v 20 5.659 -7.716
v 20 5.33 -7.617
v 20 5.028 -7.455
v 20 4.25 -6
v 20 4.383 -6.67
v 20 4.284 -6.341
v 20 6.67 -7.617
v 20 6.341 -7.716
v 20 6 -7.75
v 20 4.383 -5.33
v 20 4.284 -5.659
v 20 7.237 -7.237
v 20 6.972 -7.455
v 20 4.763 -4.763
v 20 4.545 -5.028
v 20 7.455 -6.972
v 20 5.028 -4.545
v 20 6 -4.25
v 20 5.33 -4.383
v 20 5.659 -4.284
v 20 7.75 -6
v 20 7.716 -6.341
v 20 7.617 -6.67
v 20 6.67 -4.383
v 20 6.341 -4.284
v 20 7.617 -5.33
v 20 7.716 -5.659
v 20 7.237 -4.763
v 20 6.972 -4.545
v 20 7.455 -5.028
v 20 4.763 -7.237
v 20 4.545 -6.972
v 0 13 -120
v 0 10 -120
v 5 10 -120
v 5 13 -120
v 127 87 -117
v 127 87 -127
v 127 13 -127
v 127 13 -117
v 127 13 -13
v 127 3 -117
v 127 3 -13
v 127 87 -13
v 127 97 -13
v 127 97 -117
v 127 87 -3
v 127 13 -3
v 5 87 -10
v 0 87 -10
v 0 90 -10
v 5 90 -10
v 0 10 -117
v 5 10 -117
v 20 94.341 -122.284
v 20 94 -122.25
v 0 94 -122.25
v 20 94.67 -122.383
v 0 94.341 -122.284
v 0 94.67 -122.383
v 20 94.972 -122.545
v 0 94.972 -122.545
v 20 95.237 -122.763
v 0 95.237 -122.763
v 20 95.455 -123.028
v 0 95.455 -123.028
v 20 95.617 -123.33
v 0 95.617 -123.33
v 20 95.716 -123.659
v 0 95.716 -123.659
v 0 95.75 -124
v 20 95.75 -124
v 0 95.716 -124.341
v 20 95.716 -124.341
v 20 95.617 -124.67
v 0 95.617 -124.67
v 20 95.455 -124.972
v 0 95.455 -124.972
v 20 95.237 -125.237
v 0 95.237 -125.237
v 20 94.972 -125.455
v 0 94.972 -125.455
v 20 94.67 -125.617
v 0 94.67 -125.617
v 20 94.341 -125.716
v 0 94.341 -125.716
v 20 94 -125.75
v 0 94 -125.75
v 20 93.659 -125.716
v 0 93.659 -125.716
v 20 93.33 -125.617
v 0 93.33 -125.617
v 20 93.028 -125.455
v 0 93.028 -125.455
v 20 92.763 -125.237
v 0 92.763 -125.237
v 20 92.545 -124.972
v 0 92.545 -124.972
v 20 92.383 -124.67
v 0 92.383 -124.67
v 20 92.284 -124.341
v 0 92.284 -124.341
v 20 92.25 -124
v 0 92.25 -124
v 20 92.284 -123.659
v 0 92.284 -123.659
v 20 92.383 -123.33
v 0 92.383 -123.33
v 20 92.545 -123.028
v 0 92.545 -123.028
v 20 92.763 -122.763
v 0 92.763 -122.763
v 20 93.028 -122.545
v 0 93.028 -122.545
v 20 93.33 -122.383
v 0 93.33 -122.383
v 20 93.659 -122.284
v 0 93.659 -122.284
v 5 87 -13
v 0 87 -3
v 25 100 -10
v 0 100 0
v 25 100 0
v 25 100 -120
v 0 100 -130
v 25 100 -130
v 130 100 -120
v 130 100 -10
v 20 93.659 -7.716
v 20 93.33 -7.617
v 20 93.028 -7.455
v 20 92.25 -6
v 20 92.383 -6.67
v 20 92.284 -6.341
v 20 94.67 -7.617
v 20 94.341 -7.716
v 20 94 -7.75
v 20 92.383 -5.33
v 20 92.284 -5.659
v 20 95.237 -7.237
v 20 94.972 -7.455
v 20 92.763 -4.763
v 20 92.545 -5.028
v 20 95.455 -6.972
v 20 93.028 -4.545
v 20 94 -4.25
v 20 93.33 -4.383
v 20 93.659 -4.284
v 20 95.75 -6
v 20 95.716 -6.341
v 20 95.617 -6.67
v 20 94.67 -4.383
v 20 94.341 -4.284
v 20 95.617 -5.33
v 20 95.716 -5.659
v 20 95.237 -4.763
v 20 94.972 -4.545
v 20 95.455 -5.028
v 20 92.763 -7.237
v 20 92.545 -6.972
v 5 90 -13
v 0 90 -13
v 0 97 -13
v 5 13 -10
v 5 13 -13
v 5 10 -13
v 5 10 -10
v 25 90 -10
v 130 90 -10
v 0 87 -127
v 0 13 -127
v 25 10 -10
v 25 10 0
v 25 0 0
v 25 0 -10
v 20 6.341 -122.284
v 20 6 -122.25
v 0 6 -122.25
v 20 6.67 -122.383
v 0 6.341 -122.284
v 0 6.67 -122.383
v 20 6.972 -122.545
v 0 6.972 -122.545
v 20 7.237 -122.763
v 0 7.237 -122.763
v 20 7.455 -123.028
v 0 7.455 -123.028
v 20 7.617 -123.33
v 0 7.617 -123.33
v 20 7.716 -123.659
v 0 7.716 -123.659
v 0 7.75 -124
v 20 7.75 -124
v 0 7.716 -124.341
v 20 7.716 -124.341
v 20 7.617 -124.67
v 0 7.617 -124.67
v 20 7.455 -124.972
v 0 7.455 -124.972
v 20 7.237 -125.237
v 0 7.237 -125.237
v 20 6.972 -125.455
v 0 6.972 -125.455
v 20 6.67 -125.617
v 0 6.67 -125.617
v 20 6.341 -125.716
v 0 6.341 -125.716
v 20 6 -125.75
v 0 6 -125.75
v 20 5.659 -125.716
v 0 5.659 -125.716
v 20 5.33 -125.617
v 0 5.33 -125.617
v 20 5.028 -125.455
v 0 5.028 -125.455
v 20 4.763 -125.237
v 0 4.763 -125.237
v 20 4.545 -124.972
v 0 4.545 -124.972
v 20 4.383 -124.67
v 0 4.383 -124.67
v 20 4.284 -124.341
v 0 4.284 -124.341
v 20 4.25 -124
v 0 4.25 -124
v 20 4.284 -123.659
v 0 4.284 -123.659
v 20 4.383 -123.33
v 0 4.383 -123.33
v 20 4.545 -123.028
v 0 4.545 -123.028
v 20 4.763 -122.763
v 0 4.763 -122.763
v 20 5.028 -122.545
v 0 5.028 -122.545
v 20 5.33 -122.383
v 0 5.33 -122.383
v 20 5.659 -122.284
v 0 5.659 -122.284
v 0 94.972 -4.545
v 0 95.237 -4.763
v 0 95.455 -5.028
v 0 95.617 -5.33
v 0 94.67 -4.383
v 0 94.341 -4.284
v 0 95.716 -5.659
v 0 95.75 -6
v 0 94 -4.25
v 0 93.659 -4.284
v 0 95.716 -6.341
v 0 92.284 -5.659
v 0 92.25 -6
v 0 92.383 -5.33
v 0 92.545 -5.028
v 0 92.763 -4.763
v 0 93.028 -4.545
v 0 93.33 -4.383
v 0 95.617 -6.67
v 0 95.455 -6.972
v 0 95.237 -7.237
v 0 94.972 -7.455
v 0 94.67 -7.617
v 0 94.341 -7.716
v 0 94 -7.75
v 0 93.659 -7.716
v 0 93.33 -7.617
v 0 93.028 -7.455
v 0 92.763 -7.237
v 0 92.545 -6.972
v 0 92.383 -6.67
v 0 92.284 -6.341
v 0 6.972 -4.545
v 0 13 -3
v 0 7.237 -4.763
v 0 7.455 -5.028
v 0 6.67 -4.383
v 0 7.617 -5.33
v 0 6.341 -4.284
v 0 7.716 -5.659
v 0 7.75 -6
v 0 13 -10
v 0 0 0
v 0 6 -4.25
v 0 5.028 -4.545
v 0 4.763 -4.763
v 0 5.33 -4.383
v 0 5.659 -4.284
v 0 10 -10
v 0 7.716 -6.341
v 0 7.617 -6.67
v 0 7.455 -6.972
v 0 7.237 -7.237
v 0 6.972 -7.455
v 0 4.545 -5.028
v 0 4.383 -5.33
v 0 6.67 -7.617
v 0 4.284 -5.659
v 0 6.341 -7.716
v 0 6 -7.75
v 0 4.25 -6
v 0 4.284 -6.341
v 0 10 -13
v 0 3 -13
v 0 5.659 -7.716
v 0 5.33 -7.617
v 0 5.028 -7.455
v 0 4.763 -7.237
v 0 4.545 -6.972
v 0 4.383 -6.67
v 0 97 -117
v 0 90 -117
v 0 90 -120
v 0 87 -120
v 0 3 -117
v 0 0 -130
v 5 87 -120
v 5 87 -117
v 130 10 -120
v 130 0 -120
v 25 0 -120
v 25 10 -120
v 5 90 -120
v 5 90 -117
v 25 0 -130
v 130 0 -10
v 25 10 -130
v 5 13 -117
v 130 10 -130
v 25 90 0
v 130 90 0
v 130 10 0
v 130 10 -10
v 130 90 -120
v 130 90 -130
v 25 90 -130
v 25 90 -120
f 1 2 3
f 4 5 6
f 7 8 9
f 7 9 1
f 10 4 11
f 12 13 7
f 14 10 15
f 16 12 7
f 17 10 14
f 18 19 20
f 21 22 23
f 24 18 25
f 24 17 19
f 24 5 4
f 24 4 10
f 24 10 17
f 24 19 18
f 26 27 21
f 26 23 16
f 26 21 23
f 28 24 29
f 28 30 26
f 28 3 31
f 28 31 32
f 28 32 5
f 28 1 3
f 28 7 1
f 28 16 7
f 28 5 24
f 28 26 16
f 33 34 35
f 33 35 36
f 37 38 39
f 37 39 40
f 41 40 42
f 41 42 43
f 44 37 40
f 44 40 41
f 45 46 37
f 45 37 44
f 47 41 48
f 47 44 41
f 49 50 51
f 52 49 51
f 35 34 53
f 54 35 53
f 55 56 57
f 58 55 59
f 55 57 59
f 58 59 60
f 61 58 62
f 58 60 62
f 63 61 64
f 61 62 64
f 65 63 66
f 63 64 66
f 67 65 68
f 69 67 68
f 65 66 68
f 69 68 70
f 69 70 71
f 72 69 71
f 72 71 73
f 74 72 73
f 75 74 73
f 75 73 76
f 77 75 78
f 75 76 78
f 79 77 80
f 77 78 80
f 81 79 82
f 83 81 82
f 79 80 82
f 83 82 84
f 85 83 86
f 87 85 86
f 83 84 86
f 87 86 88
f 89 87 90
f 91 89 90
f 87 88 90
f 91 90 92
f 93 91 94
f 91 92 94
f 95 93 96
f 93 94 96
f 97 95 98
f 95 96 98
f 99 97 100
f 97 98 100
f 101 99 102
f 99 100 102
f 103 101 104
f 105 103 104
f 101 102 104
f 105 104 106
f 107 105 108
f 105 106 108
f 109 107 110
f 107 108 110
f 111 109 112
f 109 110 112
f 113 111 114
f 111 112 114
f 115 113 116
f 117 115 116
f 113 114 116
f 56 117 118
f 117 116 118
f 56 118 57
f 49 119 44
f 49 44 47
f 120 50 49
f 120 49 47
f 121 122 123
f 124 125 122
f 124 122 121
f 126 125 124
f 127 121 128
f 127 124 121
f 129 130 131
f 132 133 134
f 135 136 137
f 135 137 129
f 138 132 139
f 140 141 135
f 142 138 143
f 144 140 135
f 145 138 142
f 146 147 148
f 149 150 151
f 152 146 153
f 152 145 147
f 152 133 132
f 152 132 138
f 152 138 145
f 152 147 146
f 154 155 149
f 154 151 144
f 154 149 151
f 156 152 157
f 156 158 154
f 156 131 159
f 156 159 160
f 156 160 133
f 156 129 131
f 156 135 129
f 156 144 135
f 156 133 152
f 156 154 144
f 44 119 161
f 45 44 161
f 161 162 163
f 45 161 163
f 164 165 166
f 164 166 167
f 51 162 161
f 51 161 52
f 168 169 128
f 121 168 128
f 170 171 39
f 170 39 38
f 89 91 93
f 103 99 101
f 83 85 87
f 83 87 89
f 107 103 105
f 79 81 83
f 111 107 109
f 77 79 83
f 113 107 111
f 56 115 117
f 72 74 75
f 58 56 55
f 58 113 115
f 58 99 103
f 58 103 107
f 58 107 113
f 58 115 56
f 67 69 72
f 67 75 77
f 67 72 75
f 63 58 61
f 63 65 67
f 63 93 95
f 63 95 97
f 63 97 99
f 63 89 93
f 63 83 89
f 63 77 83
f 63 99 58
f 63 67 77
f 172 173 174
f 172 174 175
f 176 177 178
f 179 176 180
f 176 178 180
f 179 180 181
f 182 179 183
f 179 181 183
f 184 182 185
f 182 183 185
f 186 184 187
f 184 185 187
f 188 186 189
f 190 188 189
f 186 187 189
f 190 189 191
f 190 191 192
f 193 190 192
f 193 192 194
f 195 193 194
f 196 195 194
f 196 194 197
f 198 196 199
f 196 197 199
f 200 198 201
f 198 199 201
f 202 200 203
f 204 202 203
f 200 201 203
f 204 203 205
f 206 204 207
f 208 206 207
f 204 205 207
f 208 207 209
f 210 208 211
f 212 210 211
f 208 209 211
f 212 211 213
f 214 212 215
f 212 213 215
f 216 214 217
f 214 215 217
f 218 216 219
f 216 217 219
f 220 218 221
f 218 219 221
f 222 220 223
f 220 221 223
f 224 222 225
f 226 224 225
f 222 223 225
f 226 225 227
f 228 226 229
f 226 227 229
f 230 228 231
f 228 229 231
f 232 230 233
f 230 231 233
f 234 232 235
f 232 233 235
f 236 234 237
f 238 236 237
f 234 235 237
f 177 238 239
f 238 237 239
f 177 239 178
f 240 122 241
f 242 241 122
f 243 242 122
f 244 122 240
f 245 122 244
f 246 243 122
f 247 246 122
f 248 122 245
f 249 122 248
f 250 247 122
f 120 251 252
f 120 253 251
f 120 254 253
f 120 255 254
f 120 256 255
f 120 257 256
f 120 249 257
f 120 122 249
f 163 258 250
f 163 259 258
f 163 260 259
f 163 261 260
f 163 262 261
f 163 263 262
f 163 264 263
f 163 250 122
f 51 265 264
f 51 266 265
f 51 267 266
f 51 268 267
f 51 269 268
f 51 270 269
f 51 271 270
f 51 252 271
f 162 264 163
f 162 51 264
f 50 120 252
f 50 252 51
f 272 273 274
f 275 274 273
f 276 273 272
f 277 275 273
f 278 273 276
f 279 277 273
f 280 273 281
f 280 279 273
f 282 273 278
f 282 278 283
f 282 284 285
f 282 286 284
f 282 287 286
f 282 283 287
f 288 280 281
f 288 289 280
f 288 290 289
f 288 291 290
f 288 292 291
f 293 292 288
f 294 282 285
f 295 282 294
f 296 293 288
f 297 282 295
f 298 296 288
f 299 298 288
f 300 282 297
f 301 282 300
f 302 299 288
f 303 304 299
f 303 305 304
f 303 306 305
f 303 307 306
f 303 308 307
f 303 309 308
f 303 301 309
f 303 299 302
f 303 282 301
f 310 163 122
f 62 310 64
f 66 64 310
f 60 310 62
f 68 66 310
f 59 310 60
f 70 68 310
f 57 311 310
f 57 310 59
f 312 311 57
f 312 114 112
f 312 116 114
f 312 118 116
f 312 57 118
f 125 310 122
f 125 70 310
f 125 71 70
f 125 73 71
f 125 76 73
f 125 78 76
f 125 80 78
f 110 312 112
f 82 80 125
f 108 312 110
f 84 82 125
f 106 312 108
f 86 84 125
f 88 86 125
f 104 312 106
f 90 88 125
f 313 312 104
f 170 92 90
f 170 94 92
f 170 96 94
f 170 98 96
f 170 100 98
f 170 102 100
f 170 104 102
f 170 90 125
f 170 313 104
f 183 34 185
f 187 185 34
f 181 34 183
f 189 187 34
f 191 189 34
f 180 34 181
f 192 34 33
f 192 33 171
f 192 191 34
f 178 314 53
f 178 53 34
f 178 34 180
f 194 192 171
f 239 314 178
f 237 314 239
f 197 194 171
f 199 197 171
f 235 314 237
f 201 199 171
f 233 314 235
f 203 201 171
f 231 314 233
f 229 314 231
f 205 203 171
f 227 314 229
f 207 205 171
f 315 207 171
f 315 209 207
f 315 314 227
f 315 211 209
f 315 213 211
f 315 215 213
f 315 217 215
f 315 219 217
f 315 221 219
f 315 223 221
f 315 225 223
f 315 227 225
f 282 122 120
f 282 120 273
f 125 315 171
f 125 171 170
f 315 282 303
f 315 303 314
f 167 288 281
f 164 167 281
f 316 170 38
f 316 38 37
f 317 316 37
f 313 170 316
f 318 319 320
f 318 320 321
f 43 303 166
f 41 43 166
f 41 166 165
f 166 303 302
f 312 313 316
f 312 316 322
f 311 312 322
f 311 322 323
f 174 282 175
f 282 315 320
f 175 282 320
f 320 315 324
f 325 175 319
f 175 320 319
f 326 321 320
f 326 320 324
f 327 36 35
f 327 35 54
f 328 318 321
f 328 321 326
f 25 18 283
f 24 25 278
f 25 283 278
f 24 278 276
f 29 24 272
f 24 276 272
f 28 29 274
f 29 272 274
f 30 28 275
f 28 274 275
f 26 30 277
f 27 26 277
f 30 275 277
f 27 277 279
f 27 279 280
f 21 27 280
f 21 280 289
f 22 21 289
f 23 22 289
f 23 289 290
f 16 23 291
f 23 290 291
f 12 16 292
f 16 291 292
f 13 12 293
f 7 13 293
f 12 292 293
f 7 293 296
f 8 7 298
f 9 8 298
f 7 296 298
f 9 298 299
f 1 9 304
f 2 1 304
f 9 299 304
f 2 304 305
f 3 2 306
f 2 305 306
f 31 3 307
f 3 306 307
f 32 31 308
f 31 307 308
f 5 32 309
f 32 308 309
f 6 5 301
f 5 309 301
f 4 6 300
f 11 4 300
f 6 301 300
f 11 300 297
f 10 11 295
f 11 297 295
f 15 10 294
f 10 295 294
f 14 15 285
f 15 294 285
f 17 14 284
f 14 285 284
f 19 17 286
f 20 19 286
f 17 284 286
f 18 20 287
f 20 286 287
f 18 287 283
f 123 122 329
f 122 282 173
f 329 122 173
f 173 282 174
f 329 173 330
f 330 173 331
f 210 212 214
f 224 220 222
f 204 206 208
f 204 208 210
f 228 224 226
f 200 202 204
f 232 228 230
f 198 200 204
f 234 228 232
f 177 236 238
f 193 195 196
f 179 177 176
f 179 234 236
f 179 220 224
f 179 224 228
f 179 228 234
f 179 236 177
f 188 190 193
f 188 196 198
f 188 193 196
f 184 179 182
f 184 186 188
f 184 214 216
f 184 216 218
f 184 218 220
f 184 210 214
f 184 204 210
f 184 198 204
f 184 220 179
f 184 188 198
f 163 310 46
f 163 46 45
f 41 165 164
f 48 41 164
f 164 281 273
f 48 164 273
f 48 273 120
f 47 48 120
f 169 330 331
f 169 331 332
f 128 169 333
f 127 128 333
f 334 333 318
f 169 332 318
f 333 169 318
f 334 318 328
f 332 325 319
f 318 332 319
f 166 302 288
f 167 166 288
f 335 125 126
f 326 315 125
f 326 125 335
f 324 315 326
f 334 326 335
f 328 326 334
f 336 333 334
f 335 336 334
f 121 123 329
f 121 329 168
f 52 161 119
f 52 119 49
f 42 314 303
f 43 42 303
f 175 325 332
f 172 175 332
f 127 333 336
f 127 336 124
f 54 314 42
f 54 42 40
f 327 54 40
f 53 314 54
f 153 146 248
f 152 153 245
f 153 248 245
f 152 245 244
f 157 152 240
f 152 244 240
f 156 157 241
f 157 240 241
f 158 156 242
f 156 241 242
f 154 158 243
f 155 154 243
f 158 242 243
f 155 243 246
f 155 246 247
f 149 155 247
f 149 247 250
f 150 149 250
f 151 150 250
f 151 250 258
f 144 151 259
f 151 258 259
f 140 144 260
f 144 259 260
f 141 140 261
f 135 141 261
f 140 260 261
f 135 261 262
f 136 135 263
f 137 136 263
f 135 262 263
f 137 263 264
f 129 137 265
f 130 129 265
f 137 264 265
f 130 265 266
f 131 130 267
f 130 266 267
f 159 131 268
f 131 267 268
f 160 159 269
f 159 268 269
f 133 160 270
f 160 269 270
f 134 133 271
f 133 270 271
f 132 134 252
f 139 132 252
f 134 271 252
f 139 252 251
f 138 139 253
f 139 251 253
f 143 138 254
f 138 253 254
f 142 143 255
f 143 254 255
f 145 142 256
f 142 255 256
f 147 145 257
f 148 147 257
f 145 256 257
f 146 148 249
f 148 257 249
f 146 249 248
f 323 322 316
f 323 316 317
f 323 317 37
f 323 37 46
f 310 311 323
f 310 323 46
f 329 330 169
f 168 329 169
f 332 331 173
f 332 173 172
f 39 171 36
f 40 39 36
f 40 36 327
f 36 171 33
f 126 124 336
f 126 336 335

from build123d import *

# Parameters (mm, degrees)
SKETCH2_W           = 130
SKETCH2_H           = 130
BOSS_EXTRUDE1_DEPTH = 100
SKETCH3_W           = 104
SKETCH3_H           = 74
CUT_EXTRUDE1_DEPTH  = 127
SKETCH4_W           = 10
SKETCH4_H           = 10
CUT_EXTRUDE3_DEPTH  = 105
SKETCH5_W           = 104
SKETCH5_H           = 10
CUT_EXTRUDE4_DEPTH  = 127
SKETCH6_W           = 10
SKETCH6_H           = 74
CUT_EXTRUDE5_DEPTH  = 127
SKETCH7_R           = 1.75
CUT_EXTRUDE6_DEPTH  = 20
SKETCH8_W           = 3
SKETCH8_H           = 3
CUT_EXTRUDE7_DEPTH  = 5


with BuildPart() as part:
    # Sketch2 → Boss-Extrude1 (new body)
    with BuildSketch(Plane(origin=(0, 0, 0), x_dir=(1, 0, 0), z_dir=(0, 1, 0))):
        with Locations((65, 65)):
            Rectangle(SKETCH2_W, SKETCH2_H)
    extrude(amount=BOSS_EXTRUDE1_DEPTH)

    # Sketch3 → Cut-Extrude1 (cut)
    with BuildSketch(Plane.ZY):
        with Locations((-65, 50)):
            Rectangle(SKETCH3_W, SKETCH3_H)
    extrude(amount=-CUT_EXTRUDE1_DEPTH, mode=Mode.SUBTRACT)

    # Sketch4 → Cut-Extrude3 (cut)
    with BuildSketch(Plane(origin=(130, 0, 0), x_dir=(0, 0, -1), z_dir=(1, 0, 0))):
        with Locations((5, 95)):
            Rectangle(SKETCH4_W, SKETCH4_H)
        with Locations((125, 95)):
            Rectangle(SKETCH4_W, SKETCH4_H)
        with Locations((5, 5)):
            Rectangle(SKETCH4_W, SKETCH4_H)
        with Locations((125, 5)):
            Rectangle(SKETCH4_W, SKETCH4_H)
    extrude(amount=-CUT_EXTRUDE3_DEPTH, mode=Mode.SUBTRACT)

    # Sketch5 → Cut-Extrude4 (cut)
    with BuildSketch(Plane.ZY):
        with Locations((-65, 92)):
            Rectangle(SKETCH5_W, SKETCH5_H)
        with Locations((-65, 8)):
            Rectangle(SKETCH5_W, SKETCH5_H)
    extrude(amount=-CUT_EXTRUDE4_DEPTH, mode=Mode.SUBTRACT)

    # Sketch6 → Cut-Extrude5 (cut)
    with BuildSketch(Plane.ZY):
        with Locations((-122, 50)):
            Rectangle(SKETCH6_W, SKETCH6_H)
        with Locations((-8, 50)):
            Rectangle(SKETCH6_W, SKETCH6_H)
    extrude(amount=-CUT_EXTRUDE5_DEPTH, mode=Mode.SUBTRACT)

    # Sketch7 → Cut-Extrude6 (cut)
    with BuildSketch(Plane.ZY):
        with Locations((-124, 94)):
            Circle(SKETCH7_R)
        with Locations((-6, 94)):
            Circle(SKETCH7_R)
        with Locations((-124, 6)):
            Circle(SKETCH7_R)
        with Locations((-6, 6)):
            Circle(SKETCH7_R)
    extrude(amount=-CUT_EXTRUDE6_DEPTH, mode=Mode.SUBTRACT)

    # Sketch8 → Cut-Extrude7 (cut)
    with BuildSketch(Plane.ZY):
        with Locations((-118.5, 88.5)):
            Rectangle(SKETCH8_W, SKETCH8_H)
        with Locations((-11.5, 88.5)):
            Rectangle(SKETCH8_W, SKETCH8_H)
        with Locations((-118.5, 11.5)):
            Rectangle(SKETCH8_W, SKETCH8_H)
        with Locations((-11.5, 11.5)):
            Rectangle(SKETCH8_W, SKETCH8_H)
    extrude(amount=-CUT_EXTRUDE7_DEPTH, mode=Mode.SUBTRACT)


solid = part.part
